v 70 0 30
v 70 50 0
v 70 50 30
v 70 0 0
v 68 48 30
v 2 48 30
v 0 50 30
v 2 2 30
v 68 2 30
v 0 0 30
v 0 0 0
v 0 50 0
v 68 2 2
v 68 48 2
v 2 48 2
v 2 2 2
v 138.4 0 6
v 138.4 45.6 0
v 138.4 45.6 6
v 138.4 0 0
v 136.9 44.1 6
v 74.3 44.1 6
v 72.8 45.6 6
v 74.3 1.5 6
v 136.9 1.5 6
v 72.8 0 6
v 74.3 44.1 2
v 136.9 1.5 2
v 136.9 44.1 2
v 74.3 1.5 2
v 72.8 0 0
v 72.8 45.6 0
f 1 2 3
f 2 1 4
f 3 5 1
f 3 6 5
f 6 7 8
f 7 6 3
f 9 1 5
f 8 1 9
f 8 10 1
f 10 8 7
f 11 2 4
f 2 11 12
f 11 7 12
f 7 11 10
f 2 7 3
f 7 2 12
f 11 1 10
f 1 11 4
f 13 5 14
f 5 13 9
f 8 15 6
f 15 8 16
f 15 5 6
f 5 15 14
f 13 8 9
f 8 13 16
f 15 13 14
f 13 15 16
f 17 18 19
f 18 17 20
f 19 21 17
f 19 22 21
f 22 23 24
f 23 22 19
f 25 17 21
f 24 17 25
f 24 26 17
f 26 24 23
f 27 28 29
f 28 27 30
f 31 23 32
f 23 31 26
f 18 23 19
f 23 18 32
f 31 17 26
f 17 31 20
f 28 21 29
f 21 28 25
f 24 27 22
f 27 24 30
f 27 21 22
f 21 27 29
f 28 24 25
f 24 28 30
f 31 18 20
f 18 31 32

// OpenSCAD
// --- Dimensions ---
// Outer box width (X)
box_w = 70;
// Outer box depth (Y)
box_d = 50;
// Outer box height (Z)
box_h = 30;
// Wall thickness
wall = 2;
// Floor thickness
floor = 2;
// Lid plate thickness
lid_thick = 2;
// Lip wall thickness
lip_wall = 1.5;
// Lip height
lip_h = 4;
// Lip outer width (X)
lip_w = 65.6;
// Lip outer depth (Y)
lip_d = 45.6;
// Gap between parts on bed
gap = 10;

// Derived dimensions
// Inner box width
box_iw = box_w - 2 * wall;
// Inner box depth
box_id = box_d - 2 * wall;
// Inner box height (usable)
box_ih = box_h - floor;

// Lip inner width (for clearance)
lip_iw = lip_w - 2 * lip_wall;
// Lip inner depth (for clearance)
lip_id = lip_d - 2 * lip_wall;

// Position offsets to place parts side by side
// Box centered at origin in X, lid to the right
box_x = 0;
box_y = 0;
lid_x = (box_w / 2) + (gap / 2) + (lip_w / 2);
lid_y = 0;

// --- Part 1: Box ---
translate([box_x, box_y, 0]) {
    // Outer shell
    difference() {
        // Full outer block
        cube([box_w, box_d, box_h], center = false);
        
        // Hollow out the inside (extend past bottom to cut through floor)
        translate([wall, wall, -0.01])
            cube([box_iw, box_id, box_h + 0.02], center = false);
    }
    
    // Floor (already created by the difference above, but let's ensure it's solid)
    // The difference above creates a box with floor thickness = wall (since we cut from z=0)
    // We need to add floor material below the cut
    // Actually, let's rebuild: outer block minus inner block starting from floor height
    // Let's redo this properly
}

// Let's rebuild Part 1 properly
translate([box_x, box_y, 0]) {
    difference() {
        // Outer solid block
        cube([box_w, box_d, box_h], center = false);
        
        // Inner cavity (starts at floor height, extends up)
        translate([wall, wall, floor])
            cube([box_iw, box_id, box_h - floor + 0.01], center = false);
    }
}

// --- Part 2: Lid (printed upside down) ---
translate([lid_x, lid_y, 0]) {
    // Plate (base)
    cube([lip_w, lip_d, lid_thick], center = false);
    
    // Lip walls (extruding upward from the plate)
    // Since lid is printed upside down, the lip will be on top when flipped
    // The lip is a hollow rectangular frame
    
    // Outer lip shape
    difference() {
        // Full lip block
        translate([0, 0, lid_thick])
            cube([lip_w, lip_d, lip_h], center = false);
        
        // Hollow center
        translate([(lip_w - lip_iw) / 2, (lip_d - lip_id) / 2, lid_thick])
            cube([lip_iw, lip_id, lip_h + 0.01], center = false);
    }
}
